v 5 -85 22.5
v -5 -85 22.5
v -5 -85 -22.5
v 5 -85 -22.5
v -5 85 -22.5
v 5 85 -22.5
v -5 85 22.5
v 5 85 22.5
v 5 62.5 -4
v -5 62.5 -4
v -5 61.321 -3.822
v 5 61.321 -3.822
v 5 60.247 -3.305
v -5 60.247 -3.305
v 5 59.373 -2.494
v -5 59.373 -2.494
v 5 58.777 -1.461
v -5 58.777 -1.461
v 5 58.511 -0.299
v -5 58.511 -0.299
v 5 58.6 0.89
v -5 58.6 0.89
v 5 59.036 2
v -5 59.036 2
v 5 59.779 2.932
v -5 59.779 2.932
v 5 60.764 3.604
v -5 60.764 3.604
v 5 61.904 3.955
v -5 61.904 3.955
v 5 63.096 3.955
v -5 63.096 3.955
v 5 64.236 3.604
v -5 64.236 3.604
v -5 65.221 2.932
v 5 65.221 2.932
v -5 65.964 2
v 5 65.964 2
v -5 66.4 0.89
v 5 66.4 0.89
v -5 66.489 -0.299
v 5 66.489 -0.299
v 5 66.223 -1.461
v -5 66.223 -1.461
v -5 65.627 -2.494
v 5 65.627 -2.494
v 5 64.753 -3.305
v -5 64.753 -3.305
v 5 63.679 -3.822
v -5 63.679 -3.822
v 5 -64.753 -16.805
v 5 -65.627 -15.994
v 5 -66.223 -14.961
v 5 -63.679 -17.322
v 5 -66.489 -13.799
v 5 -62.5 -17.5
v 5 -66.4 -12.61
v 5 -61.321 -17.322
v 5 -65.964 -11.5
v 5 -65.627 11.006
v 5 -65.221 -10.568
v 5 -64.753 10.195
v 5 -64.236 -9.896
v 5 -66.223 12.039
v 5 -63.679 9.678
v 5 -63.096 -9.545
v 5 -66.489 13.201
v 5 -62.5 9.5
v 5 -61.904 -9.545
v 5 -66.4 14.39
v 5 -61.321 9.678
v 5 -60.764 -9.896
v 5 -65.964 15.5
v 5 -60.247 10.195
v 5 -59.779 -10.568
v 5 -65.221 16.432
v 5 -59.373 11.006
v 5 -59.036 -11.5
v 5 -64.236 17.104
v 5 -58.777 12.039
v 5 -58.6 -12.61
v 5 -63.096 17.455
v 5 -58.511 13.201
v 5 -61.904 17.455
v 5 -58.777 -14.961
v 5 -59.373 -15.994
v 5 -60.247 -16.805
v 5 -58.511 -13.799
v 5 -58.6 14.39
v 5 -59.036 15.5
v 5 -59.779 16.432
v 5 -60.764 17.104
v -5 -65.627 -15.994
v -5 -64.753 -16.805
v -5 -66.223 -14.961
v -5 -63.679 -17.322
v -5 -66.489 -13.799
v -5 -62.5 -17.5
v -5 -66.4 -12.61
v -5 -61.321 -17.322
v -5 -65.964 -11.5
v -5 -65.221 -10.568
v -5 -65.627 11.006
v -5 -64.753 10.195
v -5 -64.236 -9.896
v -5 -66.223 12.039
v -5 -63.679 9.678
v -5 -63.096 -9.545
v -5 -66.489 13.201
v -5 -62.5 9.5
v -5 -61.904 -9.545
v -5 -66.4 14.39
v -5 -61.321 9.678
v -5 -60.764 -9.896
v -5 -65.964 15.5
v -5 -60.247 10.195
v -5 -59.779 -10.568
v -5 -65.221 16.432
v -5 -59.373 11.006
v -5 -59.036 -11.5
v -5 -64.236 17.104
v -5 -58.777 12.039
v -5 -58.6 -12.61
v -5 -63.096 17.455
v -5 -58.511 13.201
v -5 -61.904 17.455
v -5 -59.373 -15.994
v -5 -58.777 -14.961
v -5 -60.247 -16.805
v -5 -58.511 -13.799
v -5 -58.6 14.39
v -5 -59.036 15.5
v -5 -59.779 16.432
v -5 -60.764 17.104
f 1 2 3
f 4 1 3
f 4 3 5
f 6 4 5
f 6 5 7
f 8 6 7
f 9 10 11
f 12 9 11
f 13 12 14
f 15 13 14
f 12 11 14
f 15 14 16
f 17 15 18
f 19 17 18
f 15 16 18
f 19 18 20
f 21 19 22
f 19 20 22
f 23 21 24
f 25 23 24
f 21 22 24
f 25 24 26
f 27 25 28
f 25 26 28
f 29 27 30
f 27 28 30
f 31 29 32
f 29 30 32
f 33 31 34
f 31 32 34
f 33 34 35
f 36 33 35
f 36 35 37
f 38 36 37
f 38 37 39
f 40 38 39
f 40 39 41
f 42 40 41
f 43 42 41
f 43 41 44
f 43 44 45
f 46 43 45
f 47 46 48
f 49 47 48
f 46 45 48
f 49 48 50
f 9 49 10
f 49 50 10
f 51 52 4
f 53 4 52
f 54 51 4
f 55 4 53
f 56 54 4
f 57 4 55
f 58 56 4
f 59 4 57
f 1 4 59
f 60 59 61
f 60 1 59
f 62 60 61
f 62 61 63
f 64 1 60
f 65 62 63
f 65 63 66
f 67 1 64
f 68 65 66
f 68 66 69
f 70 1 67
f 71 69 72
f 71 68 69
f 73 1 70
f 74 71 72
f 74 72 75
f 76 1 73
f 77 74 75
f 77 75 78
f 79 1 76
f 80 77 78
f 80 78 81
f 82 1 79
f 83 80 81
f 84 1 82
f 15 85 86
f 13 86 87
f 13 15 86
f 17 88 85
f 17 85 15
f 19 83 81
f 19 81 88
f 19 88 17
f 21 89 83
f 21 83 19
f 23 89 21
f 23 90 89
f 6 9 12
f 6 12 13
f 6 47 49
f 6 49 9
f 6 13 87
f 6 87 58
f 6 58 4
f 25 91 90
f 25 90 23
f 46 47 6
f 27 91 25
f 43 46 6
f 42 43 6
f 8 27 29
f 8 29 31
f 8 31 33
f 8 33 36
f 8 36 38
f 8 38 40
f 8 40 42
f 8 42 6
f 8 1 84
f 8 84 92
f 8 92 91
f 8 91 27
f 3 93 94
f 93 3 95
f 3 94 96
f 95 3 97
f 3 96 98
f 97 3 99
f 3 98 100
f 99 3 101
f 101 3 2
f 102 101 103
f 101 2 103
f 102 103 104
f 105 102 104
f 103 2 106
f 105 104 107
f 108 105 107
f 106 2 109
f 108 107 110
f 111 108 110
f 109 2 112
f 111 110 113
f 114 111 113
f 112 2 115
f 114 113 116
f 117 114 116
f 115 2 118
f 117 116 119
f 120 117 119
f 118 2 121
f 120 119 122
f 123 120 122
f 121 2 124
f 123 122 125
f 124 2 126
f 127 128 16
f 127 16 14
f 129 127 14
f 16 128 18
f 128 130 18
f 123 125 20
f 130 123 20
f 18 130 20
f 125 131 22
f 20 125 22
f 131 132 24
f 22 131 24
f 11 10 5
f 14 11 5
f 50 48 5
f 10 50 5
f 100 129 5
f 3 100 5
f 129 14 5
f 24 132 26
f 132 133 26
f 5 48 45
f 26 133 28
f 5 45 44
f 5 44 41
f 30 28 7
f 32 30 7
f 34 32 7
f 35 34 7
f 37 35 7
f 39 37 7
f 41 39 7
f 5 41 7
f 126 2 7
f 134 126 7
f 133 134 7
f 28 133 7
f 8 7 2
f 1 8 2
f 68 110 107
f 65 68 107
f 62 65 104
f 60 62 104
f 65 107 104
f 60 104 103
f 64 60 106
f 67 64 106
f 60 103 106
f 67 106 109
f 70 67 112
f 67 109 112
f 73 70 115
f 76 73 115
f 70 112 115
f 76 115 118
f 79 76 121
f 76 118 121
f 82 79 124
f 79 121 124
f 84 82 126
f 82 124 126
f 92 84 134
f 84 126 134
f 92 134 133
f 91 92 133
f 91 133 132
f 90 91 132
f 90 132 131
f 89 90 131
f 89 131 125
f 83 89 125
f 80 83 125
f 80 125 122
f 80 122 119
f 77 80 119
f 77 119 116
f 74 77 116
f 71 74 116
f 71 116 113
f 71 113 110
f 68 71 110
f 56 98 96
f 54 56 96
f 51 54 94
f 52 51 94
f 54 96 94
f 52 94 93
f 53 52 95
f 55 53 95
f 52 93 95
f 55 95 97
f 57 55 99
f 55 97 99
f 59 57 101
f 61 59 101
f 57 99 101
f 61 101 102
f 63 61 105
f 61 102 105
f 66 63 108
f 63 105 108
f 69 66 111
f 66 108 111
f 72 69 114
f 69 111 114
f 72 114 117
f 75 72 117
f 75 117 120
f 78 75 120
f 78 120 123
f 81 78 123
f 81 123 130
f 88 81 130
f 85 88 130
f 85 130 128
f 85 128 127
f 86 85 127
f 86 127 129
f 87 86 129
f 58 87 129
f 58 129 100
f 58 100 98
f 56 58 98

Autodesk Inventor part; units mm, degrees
ref_plane "YZ Plane" through (0, 0, 0) normal (1, 0, 0) x (0, 1, 0)
ref_plane "XZ Plane" through (0, 0, 0) normal (0, 1, 0) x (-1, 0, 0)
ref_plane "XY Plane" through (0, 0, 0) normal (0, 0, 1) x (1, 0, 0)
sketch "Sketch1" plane through (0, 0, 0) normal (1, 0, 0) x (0, 1, 0)
  line L0 (85, 22.5) -> (-85, 22.5)
  line L1 (-85, 22.5) -> (-85, -22.5)
  line L2 (-85, -22.5) -> (85, -22.5)
  line L3 (85, -22.5) -> (85, 22.5)
  point P0 (0, 0)
  point P1 (85, 0)
  point P2 (0, 22.5)
  dimension "d0" = 170
  dimension "d1" = 45
extrude "Extrusion1" add sketch "Sketch1" along normal mid plane 10
sketch "Sketch2" plane through (5, 0, 0) normal (1, 0, 0) x (0, 0, -1)
  line L0 (-13.5, -62.5) -> (13.5, -62.5) construction
  line L1 (-22.5, -85) -> (22.5, -85) construction
  point P0 (0, 0)
  point P1 (0, -62.5)
  dimension "d4" = 27
  dimension "d5" = 22.5
hole "BCA M8" at (5, -62.5, 13.5) at (5, -62.5, -13.5) direction (-1, 0, 0) diameter 8 end through all
sketch "Sketch3" plane through (5, 0, 0) normal (1, 0, 0) x (0, 0, -1)
  line L0 (22.5, 85) -> (-22.5, 85) projected
  point P0 (0, 0)
  point P1 (0, 62.5)
  dimension "d13" = 22.5
hole "Hole2" at (5, 62.5, 0) direction (-1, 0, 0) diameter 8 end through all
properties part number "Sujetador prensa Trigger"
